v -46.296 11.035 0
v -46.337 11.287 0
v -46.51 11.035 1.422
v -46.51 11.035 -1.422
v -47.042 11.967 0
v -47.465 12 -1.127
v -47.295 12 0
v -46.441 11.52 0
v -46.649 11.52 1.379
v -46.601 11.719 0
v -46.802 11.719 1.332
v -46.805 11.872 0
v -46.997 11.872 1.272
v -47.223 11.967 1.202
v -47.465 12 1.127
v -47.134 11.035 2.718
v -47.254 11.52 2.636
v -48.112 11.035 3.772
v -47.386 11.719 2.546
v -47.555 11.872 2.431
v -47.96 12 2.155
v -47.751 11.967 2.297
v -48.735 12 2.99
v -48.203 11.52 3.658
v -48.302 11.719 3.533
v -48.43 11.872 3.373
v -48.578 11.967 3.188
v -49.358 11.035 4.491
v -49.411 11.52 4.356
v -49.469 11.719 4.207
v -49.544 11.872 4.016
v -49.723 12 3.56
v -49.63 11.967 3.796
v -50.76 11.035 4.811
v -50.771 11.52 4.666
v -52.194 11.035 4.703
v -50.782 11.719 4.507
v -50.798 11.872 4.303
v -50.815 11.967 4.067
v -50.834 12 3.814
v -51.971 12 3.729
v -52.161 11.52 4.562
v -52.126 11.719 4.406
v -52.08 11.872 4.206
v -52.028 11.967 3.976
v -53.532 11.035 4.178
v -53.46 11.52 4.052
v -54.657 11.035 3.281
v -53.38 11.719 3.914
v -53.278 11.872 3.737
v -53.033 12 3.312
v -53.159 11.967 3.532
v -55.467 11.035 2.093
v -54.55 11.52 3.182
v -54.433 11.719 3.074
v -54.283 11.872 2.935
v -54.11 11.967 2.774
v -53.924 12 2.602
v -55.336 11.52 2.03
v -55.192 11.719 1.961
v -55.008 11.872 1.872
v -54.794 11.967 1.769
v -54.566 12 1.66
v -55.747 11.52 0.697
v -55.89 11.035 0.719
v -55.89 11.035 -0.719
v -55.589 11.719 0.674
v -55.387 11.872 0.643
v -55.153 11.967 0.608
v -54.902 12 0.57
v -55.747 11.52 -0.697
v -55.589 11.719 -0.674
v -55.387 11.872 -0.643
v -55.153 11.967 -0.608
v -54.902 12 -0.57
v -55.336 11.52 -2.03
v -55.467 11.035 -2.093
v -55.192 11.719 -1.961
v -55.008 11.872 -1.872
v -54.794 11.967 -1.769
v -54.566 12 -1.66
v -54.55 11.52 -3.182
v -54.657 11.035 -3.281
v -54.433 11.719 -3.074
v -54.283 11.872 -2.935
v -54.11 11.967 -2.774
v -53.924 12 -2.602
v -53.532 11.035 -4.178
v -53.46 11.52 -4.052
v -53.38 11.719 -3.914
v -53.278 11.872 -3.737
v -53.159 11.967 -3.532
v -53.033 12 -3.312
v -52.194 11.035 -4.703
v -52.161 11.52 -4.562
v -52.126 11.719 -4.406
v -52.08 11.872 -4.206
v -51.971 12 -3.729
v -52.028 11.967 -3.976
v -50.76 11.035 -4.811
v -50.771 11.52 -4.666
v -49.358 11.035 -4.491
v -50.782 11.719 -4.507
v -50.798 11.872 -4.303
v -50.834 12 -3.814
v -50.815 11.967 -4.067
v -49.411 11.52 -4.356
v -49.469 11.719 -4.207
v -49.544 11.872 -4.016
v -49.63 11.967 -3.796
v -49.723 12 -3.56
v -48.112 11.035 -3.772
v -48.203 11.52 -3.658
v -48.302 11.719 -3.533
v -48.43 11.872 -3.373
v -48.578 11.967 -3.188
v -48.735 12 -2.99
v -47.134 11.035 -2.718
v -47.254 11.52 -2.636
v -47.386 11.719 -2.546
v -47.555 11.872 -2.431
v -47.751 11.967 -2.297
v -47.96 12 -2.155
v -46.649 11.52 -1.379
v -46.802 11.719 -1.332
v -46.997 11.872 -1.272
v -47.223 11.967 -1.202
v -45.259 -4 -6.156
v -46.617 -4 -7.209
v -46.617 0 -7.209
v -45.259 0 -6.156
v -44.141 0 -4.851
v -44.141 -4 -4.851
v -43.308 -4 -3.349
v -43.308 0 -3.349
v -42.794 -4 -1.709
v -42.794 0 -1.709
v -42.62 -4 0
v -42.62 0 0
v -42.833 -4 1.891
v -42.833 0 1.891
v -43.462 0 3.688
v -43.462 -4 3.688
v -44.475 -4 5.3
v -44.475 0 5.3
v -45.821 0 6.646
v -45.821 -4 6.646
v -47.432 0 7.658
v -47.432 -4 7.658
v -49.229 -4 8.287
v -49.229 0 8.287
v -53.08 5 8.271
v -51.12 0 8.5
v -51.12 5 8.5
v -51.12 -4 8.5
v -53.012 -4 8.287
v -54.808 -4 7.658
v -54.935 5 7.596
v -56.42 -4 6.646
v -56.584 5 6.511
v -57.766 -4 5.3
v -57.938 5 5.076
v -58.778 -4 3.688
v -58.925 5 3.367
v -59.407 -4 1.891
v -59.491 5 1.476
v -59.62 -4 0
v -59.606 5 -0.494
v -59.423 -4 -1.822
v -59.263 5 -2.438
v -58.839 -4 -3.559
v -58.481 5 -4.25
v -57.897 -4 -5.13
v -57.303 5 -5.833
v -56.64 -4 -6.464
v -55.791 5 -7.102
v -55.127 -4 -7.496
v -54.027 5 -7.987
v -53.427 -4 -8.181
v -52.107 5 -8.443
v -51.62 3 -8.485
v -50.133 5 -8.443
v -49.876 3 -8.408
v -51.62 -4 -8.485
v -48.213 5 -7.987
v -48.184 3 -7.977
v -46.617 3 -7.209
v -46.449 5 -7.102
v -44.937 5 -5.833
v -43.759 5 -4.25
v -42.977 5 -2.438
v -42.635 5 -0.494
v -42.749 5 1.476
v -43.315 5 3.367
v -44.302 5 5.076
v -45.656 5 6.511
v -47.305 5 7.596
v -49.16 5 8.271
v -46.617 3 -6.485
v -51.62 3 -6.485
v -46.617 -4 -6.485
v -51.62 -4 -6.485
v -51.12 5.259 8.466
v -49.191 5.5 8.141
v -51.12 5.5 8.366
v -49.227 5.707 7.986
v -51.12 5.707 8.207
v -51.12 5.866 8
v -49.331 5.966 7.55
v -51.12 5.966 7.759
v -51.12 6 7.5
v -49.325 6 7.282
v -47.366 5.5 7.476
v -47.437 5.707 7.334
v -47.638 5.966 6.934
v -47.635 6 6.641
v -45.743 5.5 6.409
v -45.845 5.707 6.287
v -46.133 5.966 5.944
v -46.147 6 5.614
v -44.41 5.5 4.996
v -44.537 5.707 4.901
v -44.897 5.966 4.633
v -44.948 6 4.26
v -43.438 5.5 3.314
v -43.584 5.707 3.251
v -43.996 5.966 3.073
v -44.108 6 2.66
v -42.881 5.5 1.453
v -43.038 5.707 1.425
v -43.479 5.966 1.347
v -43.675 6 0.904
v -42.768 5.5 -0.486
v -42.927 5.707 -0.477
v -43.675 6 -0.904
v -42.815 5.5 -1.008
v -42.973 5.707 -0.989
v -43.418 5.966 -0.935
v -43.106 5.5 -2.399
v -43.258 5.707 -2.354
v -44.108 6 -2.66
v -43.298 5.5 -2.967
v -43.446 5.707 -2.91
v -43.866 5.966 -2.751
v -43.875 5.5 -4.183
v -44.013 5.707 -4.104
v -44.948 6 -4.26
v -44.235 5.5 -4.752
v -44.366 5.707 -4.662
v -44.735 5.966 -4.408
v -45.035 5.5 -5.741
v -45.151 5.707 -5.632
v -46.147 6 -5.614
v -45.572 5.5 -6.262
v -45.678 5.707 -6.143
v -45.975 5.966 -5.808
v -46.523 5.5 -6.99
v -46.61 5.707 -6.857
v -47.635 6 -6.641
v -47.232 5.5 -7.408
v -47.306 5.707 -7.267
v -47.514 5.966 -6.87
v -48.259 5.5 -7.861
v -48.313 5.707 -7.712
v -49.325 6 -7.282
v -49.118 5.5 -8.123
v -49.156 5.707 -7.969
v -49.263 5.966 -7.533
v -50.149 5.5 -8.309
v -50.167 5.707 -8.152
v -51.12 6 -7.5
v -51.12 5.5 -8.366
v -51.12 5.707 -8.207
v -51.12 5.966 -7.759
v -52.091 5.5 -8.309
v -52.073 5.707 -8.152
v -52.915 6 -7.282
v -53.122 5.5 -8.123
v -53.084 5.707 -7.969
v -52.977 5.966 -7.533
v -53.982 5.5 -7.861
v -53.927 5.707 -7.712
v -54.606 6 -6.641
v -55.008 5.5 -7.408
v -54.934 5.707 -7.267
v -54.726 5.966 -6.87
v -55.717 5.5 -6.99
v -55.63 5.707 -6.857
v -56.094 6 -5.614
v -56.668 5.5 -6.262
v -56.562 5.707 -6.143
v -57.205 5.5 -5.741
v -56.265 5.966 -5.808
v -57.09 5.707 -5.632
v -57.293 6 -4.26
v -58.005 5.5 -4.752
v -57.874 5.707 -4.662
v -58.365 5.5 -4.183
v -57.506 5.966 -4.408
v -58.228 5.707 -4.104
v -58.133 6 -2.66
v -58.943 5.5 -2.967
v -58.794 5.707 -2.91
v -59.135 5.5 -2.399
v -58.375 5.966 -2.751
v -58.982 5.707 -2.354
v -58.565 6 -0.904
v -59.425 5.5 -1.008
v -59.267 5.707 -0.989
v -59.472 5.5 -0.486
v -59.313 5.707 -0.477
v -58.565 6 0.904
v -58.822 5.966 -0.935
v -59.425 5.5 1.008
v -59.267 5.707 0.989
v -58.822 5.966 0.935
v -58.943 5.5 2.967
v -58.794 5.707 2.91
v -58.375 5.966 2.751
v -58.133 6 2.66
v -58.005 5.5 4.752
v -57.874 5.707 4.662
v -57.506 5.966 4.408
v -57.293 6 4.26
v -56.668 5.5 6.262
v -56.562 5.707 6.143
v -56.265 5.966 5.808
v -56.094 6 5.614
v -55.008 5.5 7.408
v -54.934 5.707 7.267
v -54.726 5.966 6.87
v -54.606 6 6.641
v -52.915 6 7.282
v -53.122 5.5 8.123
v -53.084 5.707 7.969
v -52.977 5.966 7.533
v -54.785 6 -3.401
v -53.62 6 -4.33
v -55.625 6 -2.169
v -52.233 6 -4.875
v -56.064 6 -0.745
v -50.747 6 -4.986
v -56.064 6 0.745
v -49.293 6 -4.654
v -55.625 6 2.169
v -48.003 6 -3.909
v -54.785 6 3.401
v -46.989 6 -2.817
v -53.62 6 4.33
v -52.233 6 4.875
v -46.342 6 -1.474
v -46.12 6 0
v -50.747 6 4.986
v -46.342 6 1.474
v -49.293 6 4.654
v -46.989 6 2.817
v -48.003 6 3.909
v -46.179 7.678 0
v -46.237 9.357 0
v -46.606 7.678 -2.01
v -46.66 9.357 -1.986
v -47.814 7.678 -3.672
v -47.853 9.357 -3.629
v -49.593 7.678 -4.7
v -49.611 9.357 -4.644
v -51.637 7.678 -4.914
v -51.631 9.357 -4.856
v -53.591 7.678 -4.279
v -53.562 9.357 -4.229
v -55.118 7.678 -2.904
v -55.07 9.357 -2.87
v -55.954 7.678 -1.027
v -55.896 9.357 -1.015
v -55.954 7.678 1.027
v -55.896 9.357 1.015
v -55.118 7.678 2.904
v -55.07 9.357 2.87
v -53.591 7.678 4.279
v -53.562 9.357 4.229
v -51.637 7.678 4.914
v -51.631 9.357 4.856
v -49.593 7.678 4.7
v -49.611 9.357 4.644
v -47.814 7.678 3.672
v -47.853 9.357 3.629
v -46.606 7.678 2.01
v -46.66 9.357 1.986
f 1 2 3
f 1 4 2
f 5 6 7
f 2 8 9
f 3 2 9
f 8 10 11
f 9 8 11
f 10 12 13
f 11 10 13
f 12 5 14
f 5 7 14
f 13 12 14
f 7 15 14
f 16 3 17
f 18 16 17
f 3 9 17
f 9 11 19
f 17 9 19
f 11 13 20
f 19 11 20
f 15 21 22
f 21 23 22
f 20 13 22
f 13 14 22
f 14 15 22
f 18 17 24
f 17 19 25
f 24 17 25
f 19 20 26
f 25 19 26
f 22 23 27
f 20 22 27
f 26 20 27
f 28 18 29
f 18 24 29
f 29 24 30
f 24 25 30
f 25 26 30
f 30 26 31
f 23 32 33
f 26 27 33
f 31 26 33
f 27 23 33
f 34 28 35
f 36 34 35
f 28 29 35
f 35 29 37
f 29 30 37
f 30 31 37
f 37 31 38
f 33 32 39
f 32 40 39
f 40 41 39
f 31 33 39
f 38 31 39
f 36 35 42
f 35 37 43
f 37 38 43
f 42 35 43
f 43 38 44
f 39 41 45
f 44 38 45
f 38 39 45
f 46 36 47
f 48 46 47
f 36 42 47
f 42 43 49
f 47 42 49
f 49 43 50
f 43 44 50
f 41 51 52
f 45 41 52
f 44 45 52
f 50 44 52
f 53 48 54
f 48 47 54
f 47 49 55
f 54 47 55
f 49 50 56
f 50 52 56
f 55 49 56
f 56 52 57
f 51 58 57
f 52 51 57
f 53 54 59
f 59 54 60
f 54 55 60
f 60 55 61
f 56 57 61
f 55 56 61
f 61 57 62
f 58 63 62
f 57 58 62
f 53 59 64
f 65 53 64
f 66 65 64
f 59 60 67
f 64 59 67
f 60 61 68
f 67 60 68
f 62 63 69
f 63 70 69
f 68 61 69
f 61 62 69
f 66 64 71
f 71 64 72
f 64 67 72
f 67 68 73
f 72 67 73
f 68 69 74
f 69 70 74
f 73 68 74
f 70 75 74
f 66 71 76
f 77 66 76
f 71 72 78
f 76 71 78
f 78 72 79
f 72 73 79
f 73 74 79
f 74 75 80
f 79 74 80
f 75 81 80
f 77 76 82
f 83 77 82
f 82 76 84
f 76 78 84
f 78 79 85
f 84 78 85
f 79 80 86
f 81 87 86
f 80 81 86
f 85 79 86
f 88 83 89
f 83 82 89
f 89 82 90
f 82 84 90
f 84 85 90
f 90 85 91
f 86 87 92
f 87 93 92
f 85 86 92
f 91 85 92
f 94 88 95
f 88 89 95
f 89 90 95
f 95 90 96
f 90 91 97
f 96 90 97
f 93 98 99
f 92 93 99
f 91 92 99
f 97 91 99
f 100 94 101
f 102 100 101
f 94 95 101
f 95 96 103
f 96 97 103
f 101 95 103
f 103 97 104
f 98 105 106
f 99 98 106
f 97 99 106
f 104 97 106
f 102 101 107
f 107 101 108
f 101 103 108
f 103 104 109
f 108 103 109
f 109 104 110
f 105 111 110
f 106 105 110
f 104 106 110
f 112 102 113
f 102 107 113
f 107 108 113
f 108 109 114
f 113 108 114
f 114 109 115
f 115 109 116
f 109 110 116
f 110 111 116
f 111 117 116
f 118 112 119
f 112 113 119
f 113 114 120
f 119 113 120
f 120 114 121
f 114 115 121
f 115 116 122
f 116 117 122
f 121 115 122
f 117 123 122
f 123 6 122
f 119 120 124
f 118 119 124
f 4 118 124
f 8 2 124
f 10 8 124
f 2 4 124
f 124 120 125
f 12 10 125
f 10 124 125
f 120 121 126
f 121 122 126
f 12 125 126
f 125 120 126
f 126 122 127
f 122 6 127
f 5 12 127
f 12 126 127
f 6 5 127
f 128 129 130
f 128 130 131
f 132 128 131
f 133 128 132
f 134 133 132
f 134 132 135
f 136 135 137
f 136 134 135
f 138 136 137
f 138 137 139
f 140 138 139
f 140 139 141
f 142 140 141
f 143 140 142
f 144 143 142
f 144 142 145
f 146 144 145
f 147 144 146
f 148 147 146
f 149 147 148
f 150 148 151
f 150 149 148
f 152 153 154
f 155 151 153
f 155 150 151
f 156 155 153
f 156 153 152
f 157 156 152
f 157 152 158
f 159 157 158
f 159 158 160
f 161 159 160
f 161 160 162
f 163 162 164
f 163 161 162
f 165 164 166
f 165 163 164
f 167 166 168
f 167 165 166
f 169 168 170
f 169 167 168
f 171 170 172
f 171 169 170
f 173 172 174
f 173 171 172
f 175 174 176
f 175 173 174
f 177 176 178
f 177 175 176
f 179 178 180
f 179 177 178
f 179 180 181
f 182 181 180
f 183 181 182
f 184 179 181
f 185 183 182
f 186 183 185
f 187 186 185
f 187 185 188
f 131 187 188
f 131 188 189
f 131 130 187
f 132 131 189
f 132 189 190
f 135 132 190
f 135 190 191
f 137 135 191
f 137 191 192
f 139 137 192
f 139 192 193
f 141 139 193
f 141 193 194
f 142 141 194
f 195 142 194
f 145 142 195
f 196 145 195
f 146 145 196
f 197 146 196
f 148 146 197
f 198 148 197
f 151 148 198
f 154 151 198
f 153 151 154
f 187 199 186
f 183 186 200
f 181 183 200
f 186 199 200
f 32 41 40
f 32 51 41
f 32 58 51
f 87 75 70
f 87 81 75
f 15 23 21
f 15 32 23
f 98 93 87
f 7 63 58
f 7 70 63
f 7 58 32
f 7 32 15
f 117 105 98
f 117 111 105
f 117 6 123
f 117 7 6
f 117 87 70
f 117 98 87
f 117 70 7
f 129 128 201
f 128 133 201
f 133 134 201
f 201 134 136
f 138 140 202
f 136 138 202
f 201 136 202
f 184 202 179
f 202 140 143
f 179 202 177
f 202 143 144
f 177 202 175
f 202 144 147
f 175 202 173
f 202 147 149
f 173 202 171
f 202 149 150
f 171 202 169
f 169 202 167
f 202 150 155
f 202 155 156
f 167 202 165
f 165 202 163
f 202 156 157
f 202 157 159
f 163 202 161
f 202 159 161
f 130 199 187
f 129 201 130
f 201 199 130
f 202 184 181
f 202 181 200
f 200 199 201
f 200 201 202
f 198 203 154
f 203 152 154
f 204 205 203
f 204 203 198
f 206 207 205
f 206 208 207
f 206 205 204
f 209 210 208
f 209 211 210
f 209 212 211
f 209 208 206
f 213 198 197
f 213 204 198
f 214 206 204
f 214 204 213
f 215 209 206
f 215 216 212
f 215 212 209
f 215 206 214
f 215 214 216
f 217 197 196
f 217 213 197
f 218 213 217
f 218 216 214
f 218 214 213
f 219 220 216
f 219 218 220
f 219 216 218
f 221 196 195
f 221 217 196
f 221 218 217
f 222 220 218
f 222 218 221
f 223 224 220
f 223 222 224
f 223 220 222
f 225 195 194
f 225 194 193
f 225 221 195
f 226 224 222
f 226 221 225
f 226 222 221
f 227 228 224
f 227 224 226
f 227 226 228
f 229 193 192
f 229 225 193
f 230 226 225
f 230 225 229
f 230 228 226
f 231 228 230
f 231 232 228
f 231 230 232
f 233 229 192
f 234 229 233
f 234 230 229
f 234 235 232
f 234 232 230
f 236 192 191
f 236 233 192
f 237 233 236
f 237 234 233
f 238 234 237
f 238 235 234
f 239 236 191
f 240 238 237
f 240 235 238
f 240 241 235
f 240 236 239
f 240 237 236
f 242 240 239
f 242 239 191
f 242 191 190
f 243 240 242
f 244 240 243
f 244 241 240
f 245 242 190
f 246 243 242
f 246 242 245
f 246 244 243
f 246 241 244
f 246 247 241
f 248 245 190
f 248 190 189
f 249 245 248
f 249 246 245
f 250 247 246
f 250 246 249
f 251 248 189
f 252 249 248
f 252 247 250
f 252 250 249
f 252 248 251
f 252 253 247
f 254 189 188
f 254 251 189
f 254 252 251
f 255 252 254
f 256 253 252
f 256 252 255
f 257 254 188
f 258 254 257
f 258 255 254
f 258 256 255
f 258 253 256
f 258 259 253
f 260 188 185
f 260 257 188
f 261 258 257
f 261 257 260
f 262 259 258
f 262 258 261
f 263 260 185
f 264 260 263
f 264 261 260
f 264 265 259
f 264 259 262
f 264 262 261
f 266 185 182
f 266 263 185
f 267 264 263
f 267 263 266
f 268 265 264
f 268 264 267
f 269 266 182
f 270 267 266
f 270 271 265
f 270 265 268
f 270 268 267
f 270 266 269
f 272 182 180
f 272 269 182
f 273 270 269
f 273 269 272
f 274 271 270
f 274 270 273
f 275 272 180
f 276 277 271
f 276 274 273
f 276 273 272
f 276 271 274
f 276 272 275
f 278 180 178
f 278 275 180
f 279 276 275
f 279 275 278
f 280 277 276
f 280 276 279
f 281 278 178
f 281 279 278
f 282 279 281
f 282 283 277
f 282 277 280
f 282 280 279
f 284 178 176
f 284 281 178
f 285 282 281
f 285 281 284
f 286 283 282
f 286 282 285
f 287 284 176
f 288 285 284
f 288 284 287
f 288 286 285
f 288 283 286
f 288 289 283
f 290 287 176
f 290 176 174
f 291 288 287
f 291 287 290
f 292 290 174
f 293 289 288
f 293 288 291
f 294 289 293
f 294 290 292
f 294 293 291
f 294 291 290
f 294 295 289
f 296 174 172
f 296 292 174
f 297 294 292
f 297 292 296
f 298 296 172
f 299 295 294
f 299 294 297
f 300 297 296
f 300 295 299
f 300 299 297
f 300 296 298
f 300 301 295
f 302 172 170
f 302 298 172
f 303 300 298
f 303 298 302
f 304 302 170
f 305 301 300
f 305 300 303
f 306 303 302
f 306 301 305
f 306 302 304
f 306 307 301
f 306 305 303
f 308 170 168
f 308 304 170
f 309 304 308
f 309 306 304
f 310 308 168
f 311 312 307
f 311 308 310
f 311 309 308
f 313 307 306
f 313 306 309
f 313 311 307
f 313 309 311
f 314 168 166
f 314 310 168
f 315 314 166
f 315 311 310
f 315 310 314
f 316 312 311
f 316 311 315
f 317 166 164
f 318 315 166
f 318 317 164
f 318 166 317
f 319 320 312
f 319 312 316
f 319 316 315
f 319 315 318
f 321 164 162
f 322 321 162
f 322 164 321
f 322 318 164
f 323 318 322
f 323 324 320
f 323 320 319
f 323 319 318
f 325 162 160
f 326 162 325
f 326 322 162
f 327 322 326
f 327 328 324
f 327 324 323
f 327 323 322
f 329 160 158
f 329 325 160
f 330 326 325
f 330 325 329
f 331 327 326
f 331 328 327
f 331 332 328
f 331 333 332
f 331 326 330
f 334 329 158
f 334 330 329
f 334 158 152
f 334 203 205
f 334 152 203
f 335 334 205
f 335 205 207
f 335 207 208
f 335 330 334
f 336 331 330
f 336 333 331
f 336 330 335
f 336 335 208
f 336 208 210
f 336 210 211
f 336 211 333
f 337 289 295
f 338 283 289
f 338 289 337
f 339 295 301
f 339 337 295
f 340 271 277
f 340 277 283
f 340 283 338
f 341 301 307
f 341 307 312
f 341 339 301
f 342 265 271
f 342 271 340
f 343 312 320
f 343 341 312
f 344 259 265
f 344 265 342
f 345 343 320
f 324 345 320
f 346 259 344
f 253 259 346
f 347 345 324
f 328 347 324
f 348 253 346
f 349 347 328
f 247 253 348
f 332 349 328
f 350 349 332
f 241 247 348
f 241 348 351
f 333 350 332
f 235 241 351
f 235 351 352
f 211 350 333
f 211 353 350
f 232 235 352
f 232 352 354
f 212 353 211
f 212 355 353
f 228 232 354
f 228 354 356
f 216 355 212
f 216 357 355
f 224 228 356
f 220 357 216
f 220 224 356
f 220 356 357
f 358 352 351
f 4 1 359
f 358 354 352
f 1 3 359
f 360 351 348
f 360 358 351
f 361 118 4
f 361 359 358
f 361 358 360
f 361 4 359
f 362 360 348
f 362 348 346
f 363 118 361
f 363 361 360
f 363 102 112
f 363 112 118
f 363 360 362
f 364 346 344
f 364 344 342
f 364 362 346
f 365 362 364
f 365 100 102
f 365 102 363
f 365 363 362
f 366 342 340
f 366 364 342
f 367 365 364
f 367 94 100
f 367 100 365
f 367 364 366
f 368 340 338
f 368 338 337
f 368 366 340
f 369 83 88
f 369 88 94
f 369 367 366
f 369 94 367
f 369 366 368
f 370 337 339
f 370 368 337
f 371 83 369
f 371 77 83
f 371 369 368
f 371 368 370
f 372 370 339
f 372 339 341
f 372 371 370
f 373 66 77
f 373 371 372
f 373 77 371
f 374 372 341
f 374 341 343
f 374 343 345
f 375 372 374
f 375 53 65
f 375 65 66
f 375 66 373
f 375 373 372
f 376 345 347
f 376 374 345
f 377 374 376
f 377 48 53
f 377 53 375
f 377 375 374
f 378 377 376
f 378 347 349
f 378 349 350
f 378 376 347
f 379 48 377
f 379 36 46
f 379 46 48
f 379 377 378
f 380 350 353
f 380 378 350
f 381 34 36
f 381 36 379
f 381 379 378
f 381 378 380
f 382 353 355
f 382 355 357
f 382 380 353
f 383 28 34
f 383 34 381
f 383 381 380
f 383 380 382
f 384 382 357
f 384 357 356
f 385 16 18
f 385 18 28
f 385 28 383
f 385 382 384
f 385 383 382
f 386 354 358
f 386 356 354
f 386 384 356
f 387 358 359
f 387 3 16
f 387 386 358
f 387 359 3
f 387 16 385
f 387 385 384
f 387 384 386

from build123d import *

# Parameters (mm, degrees)
SKETCH1_R           = 8.5
BOSS_EXTRUDE1_DEPTH = 6
FILLET2_R           = 1
SKETCH2_R           = 5
BOSS_EXTRUDE3_DEPTH = 6
BOSS_EXTRUDE3_TAPER = 2
FILLET4_R           = 1
BOSS_EXTRUDE4_START = 4
BOSS_EXTRUDE4_DEPTH = 4
CUT_EXTRUDE4_DEPTH  = 7
SKETCH7_W           = 5.003622488
SKETCH7_H           = 7
BOSS_EXTRUDE5_DEPTH = 8


with BuildPart() as part:
    # Sketch1 → Boss-Extrude1 (new body)
    with BuildSketch(Plane(origin=(0, 0, 0), x_dir=(1, 0, 0), z_dir=(0, 1, 0))):
        with Locations(Location((-51.120170416, 0, 0), (0, 0, 270))):
            Circle(SKETCH1_R)
    extrude(amount=BOSS_EXTRUDE1_DEPTH)

    # Fillet2
    fillet2_edges = [part.edges().sort_by_distance(p)[0] for p in [
        (-51.120170416, 6, -8.5),
    ]]
    fillet(fillet2_edges, radius=FILLET2_R)

    # Sketch2 → Boss-Extrude3 (add)
    with BuildSketch(Plane(origin=(0, 6, 0), x_dir=(1, 0, 0), z_dir=(0, 1, 0))):
        with Locations((-51.120170416, 0)):
            Circle(SKETCH2_R)
    extrude(amount=BOSS_EXTRUDE3_DEPTH, taper=BOSS_EXTRUDE3_TAPER)

    # Fillet4
    fillet4_edges = [part.edges().sort_by_distance(p)[0] for p in [
        (-55.9106458, 12, 0),
    ]]
    fillet(fillet4_edges, radius=FILLET4_R)

    # Sketch3 → Boss-Extrude4 (add)
    with BuildSketch(Plane.XZ.offset(BOSS_EXTRUDE4_START)):
        with BuildLine():
            Line((-51.620170416, 0), (-59.620170416, 0))
            ThreePointArc((-59.620170416, 0), (-57.304828855, -5.830951895), (-51.620170416, -8.485281374))
            Line((-51.620170416, -8.485281374), (-51.620170416, 0))
        make_face()
        with BuildLine():
            ThreePointArc((-42.620170416, 0), (-51.120170416, 8.5), (-59.620170416, 0))
            Line((-59.620170416, 0), (-51.620170416, 0))
            Line((-51.620170416, 0), (-51.620170416, 1.514718626))
            Line((-51.620170416, 1.514718626), (-46.616547928, 1.514718626))
            Line((-46.616547928, 1.514718626), (-46.616547928, 0))
            Line((-46.616547928, 0), (-42.620170416, 0))
        make_face()
        with BuildLine():
            ThreePointArc((-46.616547928, -7.208840717), (-43.686100497, -4.121238215), (-42.620170416, 0))
            Line((-42.620170416, 0), (-46.616547928, 0))
            Line((-46.616547928, 0), (-46.616547928, -7.208840717))
        make_face()
    extrude(amount=-BOSS_EXTRUDE4_DEPTH)

    # Sketch6 → Cut-Extrude4 (cut)
    with BuildSketch(Plane.XZ.offset(4)):
        with BuildLine():
            ThreePointArc((-46.616547928, -7.208840717), (-49.019081783, -8.236226475), (-51.620170416, -8.485281374))
            Line((-51.620170416, -8.485281374), (-51.620170416, 1.514718626))
            Line((-51.620170416, 1.514718626), (-46.616547928, 1.514718626))
            Line((-46.616547928, 1.514718626), (-46.616547928, -7.208840717))
        make_face()
    extrude(amount=-CUT_EXTRUDE4_DEPTH, mode=Mode.SUBTRACT)

    # Sketch7 → Boss-Extrude5 (add)
    with BuildSketch(Plane(origin=(0, 0, 1.514718626), x_dir=(-1, 0, 0), z_dir=(0, 0, -1))):
        with Locations((49.118359172, -0.5)):
            Rectangle(SKETCH7_W, SKETCH7_H)
    extrude(amount=BOSS_EXTRUDE5_DEPTH)


solid = part.part
